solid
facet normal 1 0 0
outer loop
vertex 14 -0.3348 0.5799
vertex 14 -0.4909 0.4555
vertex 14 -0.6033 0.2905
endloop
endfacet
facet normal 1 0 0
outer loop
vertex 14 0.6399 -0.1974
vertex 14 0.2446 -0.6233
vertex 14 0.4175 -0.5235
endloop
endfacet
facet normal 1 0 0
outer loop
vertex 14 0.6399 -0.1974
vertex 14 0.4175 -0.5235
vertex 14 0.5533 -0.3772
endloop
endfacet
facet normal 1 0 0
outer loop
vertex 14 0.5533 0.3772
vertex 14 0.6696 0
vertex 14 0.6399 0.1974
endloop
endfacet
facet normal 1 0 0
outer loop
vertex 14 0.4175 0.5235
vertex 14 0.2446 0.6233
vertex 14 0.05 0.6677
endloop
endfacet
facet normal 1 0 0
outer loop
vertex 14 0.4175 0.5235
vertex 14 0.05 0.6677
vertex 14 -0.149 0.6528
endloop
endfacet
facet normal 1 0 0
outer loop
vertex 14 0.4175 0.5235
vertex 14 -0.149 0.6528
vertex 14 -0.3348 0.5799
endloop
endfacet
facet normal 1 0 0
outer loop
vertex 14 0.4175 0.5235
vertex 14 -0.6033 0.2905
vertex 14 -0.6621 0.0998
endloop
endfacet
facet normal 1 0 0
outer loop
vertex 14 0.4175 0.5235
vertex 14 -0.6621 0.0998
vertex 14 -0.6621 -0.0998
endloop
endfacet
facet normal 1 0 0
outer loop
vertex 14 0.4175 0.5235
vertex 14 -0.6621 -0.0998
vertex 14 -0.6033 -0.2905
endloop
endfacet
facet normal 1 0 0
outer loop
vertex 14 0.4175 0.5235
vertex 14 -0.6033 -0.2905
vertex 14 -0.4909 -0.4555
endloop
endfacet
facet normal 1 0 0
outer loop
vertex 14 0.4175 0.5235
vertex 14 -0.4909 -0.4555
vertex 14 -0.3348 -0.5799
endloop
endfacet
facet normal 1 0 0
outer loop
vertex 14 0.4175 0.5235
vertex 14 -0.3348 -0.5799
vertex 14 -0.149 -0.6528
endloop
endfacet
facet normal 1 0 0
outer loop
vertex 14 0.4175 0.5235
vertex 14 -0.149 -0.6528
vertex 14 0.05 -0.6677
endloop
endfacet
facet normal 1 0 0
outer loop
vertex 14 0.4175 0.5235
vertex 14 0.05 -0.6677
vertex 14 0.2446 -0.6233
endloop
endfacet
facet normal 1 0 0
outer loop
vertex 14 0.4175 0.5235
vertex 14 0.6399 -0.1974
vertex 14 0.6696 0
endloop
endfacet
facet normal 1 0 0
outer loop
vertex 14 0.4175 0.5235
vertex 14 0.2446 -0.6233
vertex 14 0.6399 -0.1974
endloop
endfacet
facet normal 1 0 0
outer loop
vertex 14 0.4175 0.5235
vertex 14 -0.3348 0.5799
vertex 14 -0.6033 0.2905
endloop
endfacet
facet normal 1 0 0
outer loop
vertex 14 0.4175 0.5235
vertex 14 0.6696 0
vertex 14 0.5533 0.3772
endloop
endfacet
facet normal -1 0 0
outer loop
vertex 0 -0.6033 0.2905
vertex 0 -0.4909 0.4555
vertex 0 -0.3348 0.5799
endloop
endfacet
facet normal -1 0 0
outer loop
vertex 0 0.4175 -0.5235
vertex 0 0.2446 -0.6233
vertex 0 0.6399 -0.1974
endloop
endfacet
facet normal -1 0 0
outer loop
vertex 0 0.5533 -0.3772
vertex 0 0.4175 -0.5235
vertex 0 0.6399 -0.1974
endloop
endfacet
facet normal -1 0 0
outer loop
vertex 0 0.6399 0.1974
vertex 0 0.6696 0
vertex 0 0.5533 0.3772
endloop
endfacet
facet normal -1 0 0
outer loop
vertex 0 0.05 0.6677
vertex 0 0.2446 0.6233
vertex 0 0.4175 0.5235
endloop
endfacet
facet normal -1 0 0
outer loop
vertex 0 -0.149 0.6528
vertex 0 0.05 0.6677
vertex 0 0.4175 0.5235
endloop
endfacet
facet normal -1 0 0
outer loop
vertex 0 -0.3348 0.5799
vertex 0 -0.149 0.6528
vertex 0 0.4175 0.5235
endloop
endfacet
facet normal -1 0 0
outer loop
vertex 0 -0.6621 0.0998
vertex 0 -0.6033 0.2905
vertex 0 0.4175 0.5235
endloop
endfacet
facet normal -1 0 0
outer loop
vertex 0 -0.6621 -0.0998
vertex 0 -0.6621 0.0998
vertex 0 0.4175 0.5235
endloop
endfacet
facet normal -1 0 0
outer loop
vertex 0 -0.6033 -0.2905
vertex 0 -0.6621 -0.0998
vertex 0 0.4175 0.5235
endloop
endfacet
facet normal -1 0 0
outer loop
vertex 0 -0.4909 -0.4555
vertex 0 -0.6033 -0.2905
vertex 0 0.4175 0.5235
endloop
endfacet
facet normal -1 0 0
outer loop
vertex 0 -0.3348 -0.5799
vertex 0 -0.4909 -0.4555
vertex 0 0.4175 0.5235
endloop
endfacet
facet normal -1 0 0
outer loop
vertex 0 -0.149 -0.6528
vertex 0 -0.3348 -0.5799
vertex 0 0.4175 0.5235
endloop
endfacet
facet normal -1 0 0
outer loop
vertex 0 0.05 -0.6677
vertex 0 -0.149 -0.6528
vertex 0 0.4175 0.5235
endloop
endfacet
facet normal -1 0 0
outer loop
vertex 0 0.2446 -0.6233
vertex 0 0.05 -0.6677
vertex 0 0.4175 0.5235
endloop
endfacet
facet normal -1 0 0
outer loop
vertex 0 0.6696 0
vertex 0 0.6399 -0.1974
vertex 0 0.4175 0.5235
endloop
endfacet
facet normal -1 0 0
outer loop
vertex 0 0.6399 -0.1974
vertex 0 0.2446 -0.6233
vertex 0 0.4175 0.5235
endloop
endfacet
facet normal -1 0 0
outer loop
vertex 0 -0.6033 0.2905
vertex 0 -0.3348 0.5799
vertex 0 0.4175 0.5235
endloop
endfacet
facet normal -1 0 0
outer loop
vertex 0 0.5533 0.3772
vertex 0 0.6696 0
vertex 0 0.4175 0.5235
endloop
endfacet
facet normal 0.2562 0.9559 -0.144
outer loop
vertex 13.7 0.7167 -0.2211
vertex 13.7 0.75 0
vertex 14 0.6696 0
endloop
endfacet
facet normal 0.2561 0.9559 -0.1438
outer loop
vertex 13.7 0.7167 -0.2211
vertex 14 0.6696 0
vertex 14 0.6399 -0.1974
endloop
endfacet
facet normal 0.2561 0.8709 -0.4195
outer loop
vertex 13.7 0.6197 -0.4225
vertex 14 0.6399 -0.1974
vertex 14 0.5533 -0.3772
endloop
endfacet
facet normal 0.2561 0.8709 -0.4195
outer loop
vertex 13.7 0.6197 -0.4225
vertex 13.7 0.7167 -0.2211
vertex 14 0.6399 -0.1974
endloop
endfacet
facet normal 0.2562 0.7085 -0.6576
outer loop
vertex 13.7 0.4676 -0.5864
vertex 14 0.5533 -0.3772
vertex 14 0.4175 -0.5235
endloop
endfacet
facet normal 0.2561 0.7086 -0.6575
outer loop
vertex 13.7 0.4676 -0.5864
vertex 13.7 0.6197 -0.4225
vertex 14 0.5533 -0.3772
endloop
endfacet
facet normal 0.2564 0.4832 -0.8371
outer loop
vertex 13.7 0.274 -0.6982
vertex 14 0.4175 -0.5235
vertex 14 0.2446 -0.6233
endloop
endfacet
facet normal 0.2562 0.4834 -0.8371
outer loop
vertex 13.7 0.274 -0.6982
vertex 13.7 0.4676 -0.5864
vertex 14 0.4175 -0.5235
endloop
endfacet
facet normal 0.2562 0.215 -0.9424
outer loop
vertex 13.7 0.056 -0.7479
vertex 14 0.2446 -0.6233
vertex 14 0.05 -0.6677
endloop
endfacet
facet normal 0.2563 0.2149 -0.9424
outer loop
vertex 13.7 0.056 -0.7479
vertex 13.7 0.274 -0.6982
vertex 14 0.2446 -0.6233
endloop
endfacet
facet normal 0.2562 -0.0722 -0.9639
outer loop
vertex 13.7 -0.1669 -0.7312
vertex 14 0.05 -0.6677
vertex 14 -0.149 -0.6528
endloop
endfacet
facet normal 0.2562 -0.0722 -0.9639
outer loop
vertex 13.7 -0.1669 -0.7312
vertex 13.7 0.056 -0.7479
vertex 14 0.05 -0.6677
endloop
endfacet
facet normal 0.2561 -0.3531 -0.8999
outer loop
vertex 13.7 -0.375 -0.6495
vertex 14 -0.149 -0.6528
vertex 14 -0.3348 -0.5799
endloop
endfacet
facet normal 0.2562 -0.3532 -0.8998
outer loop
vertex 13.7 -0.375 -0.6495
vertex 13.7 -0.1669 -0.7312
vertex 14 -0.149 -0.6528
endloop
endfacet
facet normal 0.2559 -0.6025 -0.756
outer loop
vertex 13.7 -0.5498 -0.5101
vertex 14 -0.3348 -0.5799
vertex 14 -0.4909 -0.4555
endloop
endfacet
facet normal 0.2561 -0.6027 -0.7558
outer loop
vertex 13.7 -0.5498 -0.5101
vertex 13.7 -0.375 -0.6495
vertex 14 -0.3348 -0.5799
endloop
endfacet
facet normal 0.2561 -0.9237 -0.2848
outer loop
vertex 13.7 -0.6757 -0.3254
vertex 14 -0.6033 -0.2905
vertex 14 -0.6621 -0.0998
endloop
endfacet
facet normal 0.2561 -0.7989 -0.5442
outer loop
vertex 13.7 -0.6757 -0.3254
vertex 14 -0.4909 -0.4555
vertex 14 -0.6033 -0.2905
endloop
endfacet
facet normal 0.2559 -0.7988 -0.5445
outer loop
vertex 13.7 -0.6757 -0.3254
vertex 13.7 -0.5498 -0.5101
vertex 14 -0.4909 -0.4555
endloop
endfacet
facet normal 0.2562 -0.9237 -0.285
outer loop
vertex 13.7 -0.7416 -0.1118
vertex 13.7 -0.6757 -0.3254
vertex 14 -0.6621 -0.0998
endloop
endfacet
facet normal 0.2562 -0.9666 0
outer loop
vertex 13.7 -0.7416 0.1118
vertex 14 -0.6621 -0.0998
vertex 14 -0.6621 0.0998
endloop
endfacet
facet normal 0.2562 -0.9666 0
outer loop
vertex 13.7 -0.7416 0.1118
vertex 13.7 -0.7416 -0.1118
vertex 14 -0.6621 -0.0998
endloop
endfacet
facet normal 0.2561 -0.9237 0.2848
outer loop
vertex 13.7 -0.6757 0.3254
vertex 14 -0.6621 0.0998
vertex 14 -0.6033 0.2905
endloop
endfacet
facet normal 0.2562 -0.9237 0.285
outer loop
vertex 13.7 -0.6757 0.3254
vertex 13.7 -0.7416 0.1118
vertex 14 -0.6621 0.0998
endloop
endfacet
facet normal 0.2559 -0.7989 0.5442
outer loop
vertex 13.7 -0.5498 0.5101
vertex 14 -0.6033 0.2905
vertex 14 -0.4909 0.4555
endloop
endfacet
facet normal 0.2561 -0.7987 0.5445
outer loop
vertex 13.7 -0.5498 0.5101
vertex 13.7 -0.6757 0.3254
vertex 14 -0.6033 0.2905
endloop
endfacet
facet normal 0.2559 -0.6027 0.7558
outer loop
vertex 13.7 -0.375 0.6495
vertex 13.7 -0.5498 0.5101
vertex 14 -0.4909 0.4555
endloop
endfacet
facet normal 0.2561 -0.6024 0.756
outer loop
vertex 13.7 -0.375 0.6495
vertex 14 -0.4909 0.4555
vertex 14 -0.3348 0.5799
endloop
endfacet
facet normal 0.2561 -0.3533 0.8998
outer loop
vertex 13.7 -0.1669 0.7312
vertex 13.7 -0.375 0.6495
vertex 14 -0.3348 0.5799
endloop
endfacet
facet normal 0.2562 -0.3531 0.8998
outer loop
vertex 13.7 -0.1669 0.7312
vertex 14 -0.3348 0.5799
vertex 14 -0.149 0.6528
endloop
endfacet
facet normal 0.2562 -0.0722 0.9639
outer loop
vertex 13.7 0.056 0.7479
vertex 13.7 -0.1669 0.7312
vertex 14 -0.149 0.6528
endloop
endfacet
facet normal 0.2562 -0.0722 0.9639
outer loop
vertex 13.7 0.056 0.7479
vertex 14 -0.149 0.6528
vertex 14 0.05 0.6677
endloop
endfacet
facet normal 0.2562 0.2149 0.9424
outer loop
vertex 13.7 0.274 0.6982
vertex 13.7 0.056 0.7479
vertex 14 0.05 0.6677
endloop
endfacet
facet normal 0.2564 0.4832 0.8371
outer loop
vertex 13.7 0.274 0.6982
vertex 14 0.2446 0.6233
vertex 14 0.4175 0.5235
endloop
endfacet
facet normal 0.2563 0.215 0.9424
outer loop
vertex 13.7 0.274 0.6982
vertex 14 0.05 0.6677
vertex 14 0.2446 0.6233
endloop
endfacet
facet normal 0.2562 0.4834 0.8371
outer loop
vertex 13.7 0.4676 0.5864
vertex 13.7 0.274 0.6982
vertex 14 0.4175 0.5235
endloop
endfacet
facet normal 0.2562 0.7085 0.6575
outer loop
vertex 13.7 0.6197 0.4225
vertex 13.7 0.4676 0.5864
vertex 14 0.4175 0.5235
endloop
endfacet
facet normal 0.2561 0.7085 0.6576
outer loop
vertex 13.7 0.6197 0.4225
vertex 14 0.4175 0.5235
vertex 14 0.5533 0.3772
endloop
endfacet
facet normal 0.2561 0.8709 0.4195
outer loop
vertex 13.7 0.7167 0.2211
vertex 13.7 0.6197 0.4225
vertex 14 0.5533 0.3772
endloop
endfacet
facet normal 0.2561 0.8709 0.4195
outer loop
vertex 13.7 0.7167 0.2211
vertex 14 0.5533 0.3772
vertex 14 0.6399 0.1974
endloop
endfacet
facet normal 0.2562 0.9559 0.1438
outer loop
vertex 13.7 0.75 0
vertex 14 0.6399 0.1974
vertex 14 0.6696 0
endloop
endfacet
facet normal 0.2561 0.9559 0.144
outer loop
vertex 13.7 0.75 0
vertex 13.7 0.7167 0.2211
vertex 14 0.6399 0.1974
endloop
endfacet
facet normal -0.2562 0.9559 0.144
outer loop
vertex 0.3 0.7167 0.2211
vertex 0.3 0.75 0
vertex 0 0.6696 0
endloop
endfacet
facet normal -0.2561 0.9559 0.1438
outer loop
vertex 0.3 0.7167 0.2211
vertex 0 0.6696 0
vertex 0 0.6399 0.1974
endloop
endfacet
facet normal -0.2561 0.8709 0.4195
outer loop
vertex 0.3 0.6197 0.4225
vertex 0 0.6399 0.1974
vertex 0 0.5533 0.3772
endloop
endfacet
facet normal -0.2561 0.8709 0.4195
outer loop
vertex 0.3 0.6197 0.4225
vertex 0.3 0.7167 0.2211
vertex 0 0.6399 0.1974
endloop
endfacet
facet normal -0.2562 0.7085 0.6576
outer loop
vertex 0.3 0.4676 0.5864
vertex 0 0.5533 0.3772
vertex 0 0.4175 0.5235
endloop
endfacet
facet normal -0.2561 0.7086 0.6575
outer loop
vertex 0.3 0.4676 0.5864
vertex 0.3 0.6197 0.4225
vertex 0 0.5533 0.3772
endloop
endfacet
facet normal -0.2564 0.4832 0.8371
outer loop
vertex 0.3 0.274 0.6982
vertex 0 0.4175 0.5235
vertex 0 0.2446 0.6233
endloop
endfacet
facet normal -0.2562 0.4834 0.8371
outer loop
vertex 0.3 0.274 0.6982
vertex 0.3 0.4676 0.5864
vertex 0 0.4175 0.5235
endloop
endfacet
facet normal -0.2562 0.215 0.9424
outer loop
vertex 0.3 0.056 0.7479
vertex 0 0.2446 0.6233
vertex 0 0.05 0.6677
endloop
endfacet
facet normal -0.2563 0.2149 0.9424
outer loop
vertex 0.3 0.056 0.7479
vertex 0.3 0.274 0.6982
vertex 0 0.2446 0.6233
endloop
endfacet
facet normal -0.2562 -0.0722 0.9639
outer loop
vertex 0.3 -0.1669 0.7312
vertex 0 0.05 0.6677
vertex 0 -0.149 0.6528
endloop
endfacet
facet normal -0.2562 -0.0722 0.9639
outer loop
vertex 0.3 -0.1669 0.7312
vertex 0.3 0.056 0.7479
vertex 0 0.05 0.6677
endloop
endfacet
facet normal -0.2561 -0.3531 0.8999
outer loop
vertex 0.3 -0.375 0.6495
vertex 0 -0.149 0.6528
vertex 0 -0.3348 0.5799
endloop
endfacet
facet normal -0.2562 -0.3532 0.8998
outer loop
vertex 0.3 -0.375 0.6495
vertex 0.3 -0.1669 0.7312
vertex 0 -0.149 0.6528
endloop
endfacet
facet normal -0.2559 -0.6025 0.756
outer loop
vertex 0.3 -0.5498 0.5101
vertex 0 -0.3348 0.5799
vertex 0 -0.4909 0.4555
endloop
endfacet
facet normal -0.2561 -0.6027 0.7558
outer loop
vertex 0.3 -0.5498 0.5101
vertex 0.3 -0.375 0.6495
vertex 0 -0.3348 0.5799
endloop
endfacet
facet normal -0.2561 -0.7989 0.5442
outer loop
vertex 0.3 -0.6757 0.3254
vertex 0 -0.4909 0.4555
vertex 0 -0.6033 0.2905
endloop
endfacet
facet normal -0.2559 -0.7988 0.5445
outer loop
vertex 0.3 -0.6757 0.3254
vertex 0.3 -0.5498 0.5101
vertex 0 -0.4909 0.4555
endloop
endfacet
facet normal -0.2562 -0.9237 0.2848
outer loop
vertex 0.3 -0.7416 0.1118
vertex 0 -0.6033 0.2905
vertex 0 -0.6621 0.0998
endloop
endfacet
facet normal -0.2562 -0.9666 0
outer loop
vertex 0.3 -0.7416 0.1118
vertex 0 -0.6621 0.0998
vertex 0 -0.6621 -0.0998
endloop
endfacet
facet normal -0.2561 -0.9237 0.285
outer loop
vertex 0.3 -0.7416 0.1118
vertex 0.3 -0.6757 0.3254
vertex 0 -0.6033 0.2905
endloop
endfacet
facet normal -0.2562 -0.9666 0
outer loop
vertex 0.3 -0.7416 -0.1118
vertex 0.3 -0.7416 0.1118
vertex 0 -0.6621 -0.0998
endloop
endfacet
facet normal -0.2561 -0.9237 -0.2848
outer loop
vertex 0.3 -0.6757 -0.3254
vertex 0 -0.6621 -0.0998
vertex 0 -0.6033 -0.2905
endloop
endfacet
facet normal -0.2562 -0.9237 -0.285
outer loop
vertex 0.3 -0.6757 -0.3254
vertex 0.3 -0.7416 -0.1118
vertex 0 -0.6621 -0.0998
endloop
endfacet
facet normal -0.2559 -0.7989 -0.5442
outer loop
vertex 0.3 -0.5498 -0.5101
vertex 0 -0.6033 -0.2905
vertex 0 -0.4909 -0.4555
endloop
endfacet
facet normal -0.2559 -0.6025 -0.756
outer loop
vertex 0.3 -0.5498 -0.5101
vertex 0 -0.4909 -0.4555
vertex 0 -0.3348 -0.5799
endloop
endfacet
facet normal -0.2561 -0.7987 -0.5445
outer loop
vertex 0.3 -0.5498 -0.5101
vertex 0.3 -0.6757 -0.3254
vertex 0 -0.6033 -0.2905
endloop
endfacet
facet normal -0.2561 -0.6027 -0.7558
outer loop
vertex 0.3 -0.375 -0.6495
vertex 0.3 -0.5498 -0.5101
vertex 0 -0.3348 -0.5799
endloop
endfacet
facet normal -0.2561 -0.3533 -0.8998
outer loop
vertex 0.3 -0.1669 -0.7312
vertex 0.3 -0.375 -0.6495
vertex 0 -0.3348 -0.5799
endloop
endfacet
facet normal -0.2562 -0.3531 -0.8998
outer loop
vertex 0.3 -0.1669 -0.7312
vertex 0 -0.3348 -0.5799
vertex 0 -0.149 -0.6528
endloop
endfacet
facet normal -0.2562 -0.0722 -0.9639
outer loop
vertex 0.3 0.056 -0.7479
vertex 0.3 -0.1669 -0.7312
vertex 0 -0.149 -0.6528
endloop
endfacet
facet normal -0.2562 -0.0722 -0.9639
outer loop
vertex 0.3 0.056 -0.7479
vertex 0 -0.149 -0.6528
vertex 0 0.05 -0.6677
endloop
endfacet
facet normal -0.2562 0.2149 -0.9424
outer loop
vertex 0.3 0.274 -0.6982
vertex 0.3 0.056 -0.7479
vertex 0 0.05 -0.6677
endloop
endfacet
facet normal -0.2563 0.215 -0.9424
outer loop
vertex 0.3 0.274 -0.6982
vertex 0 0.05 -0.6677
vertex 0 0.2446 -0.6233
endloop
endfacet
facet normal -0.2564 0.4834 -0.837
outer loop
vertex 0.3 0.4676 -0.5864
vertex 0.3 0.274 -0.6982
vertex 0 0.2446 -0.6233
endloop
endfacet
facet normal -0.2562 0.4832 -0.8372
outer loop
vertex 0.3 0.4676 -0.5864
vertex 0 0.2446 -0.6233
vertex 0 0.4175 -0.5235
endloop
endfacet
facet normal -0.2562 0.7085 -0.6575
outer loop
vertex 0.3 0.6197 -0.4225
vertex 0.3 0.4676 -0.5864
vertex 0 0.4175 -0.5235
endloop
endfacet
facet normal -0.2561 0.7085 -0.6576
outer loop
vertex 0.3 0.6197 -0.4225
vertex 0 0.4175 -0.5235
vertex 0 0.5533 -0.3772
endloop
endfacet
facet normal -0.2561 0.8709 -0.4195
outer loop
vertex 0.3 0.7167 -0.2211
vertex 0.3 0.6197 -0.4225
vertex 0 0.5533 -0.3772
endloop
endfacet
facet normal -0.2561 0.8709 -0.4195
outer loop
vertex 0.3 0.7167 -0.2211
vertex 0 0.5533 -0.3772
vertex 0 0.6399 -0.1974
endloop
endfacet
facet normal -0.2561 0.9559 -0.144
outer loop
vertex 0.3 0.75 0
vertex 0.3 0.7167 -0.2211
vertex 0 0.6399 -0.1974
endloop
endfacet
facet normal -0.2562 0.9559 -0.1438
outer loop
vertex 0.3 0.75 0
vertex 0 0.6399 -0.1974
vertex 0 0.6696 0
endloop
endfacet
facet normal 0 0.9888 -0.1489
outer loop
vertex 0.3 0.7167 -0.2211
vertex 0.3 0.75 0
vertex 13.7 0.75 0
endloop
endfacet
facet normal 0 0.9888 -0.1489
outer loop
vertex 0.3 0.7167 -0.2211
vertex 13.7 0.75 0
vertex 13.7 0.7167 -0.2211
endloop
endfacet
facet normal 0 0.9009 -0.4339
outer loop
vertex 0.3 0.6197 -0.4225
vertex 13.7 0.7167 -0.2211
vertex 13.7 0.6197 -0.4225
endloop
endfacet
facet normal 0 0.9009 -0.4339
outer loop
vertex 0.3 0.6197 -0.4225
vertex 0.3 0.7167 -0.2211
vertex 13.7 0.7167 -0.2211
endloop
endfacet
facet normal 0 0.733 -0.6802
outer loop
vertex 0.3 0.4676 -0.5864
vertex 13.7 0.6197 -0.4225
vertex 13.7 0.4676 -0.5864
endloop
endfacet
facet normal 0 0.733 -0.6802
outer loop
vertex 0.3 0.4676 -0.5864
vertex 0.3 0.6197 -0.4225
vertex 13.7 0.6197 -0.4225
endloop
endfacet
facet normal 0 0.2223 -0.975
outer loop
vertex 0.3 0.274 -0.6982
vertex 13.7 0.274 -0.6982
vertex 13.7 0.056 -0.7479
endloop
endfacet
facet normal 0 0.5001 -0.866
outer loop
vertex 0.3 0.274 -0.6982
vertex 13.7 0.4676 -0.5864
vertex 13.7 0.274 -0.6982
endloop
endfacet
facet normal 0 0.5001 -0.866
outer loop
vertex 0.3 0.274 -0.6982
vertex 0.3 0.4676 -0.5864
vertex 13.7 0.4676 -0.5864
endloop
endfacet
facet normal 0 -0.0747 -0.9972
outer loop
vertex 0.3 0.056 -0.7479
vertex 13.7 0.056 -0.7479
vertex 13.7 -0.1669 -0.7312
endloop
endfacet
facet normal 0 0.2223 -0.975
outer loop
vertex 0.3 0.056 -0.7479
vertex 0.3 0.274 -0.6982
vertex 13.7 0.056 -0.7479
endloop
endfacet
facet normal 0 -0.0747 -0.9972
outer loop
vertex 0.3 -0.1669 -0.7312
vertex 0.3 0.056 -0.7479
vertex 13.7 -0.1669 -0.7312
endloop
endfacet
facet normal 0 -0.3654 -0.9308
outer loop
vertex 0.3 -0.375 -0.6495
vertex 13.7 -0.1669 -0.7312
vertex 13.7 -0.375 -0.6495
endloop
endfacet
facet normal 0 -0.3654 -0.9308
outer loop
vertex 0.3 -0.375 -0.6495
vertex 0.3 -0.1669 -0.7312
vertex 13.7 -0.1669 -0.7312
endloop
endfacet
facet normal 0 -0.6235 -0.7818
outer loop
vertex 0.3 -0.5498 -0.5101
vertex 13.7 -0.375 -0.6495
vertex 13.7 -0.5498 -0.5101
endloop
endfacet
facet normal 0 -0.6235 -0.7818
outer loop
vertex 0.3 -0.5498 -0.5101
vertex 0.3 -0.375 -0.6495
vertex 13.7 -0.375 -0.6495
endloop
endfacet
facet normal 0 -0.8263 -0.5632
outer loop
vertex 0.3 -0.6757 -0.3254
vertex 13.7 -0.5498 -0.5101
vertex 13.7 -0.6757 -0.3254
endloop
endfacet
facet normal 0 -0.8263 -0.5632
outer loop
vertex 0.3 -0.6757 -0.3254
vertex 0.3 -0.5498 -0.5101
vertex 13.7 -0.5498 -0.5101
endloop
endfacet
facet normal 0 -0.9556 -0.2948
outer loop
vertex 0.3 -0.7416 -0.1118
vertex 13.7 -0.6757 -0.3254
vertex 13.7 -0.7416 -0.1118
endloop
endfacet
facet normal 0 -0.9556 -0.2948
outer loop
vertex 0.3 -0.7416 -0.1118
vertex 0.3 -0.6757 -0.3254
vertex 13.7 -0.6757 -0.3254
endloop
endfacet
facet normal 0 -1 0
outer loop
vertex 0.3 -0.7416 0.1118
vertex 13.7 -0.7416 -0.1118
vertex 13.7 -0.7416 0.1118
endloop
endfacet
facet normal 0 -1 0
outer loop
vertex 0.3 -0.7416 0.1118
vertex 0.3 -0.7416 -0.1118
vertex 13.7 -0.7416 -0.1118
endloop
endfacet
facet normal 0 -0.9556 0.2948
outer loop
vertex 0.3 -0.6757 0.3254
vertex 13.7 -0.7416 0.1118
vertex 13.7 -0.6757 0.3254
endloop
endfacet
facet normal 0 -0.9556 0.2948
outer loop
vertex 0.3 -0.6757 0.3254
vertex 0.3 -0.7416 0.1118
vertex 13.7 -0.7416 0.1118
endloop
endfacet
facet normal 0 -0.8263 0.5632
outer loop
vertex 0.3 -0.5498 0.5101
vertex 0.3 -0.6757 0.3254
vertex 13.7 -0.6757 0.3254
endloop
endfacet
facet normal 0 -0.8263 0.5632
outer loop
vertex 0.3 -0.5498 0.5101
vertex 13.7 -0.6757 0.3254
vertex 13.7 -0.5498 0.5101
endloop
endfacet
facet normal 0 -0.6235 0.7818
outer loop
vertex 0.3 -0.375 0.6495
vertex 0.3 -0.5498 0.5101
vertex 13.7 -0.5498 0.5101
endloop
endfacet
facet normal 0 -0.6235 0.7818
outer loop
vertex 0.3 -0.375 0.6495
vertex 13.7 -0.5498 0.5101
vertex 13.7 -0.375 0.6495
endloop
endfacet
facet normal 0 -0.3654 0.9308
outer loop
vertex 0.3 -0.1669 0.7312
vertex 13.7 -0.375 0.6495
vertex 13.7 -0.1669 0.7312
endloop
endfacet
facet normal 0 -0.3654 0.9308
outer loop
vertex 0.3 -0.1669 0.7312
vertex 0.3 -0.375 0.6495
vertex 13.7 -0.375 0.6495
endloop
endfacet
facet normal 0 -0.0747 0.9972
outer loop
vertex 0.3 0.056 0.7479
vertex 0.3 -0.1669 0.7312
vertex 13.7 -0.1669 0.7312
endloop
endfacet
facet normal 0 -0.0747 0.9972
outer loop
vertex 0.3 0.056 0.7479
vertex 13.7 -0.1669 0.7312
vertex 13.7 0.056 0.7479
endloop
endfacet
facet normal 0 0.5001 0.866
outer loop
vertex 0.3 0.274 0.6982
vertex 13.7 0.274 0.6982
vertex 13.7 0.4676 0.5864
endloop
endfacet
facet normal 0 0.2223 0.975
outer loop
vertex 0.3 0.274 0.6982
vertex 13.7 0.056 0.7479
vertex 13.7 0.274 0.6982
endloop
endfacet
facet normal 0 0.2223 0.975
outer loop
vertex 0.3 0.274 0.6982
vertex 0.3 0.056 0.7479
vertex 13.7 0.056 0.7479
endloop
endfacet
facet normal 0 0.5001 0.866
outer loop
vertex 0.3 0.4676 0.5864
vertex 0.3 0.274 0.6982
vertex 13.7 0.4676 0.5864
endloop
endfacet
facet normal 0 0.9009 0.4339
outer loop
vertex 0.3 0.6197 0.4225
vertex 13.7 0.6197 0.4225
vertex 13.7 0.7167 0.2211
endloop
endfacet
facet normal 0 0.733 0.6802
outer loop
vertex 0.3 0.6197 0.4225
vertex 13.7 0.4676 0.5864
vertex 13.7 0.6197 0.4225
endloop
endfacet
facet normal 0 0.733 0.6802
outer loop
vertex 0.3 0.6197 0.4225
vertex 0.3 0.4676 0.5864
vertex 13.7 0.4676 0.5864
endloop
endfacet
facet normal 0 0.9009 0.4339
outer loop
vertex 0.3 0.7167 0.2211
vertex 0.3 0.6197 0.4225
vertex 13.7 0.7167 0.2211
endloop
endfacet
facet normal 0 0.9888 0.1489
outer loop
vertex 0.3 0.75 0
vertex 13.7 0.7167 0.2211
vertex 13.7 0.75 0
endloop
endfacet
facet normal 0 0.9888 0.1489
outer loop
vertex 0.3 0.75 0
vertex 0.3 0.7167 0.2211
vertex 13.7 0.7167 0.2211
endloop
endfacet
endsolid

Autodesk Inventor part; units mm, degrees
ref_plane "YZ Plane" through (0, 0, 0) normal (1, 0, 0) x (0, 1, 0)
ref_plane "XZ Plane" through (0, 0, 0) normal (0, 1, 0) x (-1, 0, 0)
ref_plane "XY Plane" through (0, 0, 0) normal (0, 0, 1) x (1, 0, 0)
sketch "Skizze" plane through (0, 0, 0) normal (1, 0, 0) x (0, 1, 0)
  circle A0 centre (0, 0) radius 0.75
  dimension "d1" = 1.5
extrude "Körper" add sketch "Skizze" along normal blind 14
chamfer "Fase1" distance 0.3 angle 15 1 edges at (0, -0.75, 0) measured on face at (9.3333, 0.7403, -0.1203)
chamfer "Skizze2" distance 0.3 angle 15 1 edges at (14, -0.75, 0) measured on face at (9.4333, 0.7476, -0.0603)
equation "\"d1\" = NND"
equation "\"d2\" = NLG"
equation "\"d8\" = PHH"
equation "\"d9\" = FAWI"
equation "\"d12\" = PHH"
equation "\"d4\" = PHH"
equation "\"d5\" = FAWI"
equation "\"d11\" = PHH"
equation "\"NND\" = 1.5"
equation "\"NLG\" = 14"
equation "\"PHH\" = 0.3"
equation "\"FAWI\" = 15deg"
equation "\"KAH\" = 0"
properties part number "ISO 2338 - 1,5 h8 x 14" material "Edelstahl, austenitisch"
